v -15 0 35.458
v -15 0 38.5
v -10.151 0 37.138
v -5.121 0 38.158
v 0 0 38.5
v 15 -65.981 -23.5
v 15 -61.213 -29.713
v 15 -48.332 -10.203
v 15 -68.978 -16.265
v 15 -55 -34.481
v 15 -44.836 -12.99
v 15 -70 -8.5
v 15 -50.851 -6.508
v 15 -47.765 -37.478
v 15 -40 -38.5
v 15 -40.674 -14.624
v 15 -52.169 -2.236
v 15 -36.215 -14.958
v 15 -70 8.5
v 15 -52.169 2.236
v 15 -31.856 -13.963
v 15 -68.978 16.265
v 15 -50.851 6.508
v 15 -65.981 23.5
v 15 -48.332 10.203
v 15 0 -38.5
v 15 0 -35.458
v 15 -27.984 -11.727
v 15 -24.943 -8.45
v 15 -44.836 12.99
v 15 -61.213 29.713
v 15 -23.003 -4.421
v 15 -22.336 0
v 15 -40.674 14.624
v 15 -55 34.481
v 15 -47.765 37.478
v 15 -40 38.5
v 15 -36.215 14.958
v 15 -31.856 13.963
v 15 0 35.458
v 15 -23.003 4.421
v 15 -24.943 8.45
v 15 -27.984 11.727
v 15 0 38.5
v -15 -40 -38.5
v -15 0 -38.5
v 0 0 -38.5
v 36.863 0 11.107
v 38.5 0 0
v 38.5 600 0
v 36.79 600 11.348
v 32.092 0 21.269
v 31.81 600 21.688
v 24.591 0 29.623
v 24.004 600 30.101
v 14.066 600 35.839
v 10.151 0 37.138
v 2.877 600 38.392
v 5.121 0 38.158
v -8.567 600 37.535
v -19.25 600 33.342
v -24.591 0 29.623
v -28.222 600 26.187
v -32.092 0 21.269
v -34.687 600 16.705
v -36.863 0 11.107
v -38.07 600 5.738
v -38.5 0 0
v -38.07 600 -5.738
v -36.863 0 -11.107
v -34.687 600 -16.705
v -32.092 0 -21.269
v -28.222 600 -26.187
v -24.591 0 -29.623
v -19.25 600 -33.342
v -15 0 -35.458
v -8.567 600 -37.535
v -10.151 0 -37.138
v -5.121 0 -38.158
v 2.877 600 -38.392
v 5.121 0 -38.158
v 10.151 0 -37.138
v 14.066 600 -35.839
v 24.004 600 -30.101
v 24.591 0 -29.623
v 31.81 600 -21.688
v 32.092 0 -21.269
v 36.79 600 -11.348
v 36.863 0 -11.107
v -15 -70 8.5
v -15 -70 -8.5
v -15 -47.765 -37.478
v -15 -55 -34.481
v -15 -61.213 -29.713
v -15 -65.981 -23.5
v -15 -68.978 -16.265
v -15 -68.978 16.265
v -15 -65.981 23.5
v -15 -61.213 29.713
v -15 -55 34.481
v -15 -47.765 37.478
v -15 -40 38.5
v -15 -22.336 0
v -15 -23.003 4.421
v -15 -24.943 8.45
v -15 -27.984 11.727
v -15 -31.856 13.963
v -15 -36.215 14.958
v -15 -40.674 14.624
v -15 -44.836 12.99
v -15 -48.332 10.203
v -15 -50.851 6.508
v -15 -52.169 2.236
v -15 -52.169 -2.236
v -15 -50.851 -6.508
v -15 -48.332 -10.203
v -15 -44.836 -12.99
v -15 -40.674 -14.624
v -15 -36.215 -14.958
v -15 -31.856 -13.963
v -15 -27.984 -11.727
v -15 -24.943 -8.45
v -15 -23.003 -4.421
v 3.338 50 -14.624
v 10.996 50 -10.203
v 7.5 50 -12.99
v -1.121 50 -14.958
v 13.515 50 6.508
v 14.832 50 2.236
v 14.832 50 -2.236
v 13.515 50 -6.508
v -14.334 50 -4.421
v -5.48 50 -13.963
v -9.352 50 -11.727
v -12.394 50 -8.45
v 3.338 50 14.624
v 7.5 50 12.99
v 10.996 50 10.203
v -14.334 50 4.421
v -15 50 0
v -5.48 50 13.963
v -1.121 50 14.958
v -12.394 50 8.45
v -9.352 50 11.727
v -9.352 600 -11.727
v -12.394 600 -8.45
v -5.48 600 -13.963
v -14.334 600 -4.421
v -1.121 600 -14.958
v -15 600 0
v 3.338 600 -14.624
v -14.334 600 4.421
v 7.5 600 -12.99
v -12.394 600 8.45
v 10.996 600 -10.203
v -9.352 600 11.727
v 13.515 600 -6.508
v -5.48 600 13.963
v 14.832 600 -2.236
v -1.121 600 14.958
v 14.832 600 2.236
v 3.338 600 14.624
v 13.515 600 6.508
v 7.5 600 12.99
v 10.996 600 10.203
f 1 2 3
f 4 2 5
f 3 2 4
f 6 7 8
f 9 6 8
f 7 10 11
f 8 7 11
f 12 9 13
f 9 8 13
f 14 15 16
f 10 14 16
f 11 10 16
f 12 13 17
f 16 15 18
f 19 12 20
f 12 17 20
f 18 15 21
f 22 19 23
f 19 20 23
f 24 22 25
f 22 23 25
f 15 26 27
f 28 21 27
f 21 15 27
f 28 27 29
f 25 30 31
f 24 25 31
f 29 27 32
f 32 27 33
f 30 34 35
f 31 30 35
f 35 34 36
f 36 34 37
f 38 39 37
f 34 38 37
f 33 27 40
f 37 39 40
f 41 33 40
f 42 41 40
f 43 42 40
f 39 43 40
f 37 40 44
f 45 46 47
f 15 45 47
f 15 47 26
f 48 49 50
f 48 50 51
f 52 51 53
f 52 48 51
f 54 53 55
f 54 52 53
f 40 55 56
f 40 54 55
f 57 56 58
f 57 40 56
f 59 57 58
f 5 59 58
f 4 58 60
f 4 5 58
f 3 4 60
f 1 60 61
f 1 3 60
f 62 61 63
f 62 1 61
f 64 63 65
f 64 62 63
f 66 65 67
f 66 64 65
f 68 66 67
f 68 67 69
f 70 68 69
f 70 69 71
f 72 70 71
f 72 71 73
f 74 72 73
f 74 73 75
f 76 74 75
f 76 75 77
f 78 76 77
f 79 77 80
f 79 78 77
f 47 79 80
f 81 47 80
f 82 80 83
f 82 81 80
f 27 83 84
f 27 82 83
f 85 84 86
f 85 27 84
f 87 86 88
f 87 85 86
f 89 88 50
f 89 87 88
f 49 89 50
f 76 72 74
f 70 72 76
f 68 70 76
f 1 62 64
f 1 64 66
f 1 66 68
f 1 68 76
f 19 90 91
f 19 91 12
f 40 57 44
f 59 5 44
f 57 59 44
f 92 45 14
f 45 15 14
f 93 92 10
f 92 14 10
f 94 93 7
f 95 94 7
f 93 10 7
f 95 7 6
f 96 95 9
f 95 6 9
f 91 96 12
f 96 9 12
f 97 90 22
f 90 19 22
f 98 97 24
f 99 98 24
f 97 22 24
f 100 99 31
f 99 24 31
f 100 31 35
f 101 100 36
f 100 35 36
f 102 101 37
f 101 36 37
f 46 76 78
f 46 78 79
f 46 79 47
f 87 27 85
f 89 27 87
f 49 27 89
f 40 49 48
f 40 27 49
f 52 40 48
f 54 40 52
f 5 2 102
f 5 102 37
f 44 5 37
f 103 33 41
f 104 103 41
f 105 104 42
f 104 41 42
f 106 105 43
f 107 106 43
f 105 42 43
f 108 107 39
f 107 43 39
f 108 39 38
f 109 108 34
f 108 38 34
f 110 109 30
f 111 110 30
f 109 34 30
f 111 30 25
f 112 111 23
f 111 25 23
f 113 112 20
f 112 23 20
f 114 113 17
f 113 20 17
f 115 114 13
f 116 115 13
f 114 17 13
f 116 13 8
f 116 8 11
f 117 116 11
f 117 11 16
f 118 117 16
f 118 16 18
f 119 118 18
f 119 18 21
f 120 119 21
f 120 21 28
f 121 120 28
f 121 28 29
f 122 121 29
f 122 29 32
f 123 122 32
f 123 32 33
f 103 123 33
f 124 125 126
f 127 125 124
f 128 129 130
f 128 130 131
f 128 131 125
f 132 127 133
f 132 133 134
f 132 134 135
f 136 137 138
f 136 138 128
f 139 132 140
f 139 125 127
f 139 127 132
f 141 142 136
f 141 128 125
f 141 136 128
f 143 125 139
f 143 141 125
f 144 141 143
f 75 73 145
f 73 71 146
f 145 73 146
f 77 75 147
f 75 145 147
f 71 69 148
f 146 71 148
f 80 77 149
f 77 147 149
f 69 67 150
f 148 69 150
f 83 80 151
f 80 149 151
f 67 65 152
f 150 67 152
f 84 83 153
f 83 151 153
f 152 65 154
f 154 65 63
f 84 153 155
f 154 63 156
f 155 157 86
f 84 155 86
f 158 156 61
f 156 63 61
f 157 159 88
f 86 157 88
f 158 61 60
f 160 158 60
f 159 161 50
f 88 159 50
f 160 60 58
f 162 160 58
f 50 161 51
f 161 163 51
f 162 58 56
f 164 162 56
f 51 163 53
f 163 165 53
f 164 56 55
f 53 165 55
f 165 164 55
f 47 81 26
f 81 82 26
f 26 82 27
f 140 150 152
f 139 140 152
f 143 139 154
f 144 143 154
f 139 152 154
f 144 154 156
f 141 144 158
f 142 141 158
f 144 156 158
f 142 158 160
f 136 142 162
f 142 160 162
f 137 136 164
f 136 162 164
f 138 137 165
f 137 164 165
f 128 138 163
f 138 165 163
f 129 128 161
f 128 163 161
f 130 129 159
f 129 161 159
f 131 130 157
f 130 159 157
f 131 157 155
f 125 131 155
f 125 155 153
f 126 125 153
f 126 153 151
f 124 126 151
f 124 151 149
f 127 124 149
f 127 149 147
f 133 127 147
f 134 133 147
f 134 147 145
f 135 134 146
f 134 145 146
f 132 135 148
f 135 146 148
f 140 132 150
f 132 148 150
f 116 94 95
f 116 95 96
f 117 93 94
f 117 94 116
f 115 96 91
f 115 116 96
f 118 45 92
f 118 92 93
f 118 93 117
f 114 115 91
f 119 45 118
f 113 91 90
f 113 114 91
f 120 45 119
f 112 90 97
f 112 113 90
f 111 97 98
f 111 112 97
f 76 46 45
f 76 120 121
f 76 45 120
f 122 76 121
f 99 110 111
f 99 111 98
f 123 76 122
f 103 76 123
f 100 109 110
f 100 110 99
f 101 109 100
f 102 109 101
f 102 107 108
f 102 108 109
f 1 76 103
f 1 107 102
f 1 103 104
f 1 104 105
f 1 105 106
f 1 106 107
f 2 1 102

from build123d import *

# Parameters (mm, degrees)
F0_R     = 38.5
F1_DEPTH = 600
F2_W     = 30
F2_H     = 77
F3_DEPTH = 70
F4_R     = 15
F5_DEPTH = 53.501
F6_R     = 30
F7_R     = 15
F8_DEPTH = 550


with BuildPart() as f1:
    # F0 (on Front) → F1 (new body)
    with BuildSketch(Plane.XZ):
        Circle(F0_R)
    extrude(amount=-F1_DEPTH)

    # F2 (on face) → F3 (join)
    with BuildSketch(Plane.XZ):
        Rectangle(F2_W, F2_H)
    extrude(amount=F3_DEPTH)

    # F4 (on face) → F5 (cut, through all)
    with BuildSketch(Plane.YZ.offset(15)):
        with Locations((-37.336115, 0)):
            Circle(F4_R)
    extrude(amount=-F5_DEPTH, mode=Mode.SUBTRACT)

    # F6
    f6_edges = [f1.edges().sort_by_distance(p)[0] for p in [
        (0, -70, 38.5),
        (0, -70, -38.5),
    ]]
    fillet(f6_edges, radius=F6_R)

    # F7 (on face) → F8 (cut)
    with BuildSketch(Plane(origin=(0, 600, 0), x_dir=(-1, 0, 0), z_dir=(0, 1, 0))):
        Circle(F7_R)
    extrude(amount=-F8_DEPTH, mode=Mode.SUBTRACT)


solid = f1.part
